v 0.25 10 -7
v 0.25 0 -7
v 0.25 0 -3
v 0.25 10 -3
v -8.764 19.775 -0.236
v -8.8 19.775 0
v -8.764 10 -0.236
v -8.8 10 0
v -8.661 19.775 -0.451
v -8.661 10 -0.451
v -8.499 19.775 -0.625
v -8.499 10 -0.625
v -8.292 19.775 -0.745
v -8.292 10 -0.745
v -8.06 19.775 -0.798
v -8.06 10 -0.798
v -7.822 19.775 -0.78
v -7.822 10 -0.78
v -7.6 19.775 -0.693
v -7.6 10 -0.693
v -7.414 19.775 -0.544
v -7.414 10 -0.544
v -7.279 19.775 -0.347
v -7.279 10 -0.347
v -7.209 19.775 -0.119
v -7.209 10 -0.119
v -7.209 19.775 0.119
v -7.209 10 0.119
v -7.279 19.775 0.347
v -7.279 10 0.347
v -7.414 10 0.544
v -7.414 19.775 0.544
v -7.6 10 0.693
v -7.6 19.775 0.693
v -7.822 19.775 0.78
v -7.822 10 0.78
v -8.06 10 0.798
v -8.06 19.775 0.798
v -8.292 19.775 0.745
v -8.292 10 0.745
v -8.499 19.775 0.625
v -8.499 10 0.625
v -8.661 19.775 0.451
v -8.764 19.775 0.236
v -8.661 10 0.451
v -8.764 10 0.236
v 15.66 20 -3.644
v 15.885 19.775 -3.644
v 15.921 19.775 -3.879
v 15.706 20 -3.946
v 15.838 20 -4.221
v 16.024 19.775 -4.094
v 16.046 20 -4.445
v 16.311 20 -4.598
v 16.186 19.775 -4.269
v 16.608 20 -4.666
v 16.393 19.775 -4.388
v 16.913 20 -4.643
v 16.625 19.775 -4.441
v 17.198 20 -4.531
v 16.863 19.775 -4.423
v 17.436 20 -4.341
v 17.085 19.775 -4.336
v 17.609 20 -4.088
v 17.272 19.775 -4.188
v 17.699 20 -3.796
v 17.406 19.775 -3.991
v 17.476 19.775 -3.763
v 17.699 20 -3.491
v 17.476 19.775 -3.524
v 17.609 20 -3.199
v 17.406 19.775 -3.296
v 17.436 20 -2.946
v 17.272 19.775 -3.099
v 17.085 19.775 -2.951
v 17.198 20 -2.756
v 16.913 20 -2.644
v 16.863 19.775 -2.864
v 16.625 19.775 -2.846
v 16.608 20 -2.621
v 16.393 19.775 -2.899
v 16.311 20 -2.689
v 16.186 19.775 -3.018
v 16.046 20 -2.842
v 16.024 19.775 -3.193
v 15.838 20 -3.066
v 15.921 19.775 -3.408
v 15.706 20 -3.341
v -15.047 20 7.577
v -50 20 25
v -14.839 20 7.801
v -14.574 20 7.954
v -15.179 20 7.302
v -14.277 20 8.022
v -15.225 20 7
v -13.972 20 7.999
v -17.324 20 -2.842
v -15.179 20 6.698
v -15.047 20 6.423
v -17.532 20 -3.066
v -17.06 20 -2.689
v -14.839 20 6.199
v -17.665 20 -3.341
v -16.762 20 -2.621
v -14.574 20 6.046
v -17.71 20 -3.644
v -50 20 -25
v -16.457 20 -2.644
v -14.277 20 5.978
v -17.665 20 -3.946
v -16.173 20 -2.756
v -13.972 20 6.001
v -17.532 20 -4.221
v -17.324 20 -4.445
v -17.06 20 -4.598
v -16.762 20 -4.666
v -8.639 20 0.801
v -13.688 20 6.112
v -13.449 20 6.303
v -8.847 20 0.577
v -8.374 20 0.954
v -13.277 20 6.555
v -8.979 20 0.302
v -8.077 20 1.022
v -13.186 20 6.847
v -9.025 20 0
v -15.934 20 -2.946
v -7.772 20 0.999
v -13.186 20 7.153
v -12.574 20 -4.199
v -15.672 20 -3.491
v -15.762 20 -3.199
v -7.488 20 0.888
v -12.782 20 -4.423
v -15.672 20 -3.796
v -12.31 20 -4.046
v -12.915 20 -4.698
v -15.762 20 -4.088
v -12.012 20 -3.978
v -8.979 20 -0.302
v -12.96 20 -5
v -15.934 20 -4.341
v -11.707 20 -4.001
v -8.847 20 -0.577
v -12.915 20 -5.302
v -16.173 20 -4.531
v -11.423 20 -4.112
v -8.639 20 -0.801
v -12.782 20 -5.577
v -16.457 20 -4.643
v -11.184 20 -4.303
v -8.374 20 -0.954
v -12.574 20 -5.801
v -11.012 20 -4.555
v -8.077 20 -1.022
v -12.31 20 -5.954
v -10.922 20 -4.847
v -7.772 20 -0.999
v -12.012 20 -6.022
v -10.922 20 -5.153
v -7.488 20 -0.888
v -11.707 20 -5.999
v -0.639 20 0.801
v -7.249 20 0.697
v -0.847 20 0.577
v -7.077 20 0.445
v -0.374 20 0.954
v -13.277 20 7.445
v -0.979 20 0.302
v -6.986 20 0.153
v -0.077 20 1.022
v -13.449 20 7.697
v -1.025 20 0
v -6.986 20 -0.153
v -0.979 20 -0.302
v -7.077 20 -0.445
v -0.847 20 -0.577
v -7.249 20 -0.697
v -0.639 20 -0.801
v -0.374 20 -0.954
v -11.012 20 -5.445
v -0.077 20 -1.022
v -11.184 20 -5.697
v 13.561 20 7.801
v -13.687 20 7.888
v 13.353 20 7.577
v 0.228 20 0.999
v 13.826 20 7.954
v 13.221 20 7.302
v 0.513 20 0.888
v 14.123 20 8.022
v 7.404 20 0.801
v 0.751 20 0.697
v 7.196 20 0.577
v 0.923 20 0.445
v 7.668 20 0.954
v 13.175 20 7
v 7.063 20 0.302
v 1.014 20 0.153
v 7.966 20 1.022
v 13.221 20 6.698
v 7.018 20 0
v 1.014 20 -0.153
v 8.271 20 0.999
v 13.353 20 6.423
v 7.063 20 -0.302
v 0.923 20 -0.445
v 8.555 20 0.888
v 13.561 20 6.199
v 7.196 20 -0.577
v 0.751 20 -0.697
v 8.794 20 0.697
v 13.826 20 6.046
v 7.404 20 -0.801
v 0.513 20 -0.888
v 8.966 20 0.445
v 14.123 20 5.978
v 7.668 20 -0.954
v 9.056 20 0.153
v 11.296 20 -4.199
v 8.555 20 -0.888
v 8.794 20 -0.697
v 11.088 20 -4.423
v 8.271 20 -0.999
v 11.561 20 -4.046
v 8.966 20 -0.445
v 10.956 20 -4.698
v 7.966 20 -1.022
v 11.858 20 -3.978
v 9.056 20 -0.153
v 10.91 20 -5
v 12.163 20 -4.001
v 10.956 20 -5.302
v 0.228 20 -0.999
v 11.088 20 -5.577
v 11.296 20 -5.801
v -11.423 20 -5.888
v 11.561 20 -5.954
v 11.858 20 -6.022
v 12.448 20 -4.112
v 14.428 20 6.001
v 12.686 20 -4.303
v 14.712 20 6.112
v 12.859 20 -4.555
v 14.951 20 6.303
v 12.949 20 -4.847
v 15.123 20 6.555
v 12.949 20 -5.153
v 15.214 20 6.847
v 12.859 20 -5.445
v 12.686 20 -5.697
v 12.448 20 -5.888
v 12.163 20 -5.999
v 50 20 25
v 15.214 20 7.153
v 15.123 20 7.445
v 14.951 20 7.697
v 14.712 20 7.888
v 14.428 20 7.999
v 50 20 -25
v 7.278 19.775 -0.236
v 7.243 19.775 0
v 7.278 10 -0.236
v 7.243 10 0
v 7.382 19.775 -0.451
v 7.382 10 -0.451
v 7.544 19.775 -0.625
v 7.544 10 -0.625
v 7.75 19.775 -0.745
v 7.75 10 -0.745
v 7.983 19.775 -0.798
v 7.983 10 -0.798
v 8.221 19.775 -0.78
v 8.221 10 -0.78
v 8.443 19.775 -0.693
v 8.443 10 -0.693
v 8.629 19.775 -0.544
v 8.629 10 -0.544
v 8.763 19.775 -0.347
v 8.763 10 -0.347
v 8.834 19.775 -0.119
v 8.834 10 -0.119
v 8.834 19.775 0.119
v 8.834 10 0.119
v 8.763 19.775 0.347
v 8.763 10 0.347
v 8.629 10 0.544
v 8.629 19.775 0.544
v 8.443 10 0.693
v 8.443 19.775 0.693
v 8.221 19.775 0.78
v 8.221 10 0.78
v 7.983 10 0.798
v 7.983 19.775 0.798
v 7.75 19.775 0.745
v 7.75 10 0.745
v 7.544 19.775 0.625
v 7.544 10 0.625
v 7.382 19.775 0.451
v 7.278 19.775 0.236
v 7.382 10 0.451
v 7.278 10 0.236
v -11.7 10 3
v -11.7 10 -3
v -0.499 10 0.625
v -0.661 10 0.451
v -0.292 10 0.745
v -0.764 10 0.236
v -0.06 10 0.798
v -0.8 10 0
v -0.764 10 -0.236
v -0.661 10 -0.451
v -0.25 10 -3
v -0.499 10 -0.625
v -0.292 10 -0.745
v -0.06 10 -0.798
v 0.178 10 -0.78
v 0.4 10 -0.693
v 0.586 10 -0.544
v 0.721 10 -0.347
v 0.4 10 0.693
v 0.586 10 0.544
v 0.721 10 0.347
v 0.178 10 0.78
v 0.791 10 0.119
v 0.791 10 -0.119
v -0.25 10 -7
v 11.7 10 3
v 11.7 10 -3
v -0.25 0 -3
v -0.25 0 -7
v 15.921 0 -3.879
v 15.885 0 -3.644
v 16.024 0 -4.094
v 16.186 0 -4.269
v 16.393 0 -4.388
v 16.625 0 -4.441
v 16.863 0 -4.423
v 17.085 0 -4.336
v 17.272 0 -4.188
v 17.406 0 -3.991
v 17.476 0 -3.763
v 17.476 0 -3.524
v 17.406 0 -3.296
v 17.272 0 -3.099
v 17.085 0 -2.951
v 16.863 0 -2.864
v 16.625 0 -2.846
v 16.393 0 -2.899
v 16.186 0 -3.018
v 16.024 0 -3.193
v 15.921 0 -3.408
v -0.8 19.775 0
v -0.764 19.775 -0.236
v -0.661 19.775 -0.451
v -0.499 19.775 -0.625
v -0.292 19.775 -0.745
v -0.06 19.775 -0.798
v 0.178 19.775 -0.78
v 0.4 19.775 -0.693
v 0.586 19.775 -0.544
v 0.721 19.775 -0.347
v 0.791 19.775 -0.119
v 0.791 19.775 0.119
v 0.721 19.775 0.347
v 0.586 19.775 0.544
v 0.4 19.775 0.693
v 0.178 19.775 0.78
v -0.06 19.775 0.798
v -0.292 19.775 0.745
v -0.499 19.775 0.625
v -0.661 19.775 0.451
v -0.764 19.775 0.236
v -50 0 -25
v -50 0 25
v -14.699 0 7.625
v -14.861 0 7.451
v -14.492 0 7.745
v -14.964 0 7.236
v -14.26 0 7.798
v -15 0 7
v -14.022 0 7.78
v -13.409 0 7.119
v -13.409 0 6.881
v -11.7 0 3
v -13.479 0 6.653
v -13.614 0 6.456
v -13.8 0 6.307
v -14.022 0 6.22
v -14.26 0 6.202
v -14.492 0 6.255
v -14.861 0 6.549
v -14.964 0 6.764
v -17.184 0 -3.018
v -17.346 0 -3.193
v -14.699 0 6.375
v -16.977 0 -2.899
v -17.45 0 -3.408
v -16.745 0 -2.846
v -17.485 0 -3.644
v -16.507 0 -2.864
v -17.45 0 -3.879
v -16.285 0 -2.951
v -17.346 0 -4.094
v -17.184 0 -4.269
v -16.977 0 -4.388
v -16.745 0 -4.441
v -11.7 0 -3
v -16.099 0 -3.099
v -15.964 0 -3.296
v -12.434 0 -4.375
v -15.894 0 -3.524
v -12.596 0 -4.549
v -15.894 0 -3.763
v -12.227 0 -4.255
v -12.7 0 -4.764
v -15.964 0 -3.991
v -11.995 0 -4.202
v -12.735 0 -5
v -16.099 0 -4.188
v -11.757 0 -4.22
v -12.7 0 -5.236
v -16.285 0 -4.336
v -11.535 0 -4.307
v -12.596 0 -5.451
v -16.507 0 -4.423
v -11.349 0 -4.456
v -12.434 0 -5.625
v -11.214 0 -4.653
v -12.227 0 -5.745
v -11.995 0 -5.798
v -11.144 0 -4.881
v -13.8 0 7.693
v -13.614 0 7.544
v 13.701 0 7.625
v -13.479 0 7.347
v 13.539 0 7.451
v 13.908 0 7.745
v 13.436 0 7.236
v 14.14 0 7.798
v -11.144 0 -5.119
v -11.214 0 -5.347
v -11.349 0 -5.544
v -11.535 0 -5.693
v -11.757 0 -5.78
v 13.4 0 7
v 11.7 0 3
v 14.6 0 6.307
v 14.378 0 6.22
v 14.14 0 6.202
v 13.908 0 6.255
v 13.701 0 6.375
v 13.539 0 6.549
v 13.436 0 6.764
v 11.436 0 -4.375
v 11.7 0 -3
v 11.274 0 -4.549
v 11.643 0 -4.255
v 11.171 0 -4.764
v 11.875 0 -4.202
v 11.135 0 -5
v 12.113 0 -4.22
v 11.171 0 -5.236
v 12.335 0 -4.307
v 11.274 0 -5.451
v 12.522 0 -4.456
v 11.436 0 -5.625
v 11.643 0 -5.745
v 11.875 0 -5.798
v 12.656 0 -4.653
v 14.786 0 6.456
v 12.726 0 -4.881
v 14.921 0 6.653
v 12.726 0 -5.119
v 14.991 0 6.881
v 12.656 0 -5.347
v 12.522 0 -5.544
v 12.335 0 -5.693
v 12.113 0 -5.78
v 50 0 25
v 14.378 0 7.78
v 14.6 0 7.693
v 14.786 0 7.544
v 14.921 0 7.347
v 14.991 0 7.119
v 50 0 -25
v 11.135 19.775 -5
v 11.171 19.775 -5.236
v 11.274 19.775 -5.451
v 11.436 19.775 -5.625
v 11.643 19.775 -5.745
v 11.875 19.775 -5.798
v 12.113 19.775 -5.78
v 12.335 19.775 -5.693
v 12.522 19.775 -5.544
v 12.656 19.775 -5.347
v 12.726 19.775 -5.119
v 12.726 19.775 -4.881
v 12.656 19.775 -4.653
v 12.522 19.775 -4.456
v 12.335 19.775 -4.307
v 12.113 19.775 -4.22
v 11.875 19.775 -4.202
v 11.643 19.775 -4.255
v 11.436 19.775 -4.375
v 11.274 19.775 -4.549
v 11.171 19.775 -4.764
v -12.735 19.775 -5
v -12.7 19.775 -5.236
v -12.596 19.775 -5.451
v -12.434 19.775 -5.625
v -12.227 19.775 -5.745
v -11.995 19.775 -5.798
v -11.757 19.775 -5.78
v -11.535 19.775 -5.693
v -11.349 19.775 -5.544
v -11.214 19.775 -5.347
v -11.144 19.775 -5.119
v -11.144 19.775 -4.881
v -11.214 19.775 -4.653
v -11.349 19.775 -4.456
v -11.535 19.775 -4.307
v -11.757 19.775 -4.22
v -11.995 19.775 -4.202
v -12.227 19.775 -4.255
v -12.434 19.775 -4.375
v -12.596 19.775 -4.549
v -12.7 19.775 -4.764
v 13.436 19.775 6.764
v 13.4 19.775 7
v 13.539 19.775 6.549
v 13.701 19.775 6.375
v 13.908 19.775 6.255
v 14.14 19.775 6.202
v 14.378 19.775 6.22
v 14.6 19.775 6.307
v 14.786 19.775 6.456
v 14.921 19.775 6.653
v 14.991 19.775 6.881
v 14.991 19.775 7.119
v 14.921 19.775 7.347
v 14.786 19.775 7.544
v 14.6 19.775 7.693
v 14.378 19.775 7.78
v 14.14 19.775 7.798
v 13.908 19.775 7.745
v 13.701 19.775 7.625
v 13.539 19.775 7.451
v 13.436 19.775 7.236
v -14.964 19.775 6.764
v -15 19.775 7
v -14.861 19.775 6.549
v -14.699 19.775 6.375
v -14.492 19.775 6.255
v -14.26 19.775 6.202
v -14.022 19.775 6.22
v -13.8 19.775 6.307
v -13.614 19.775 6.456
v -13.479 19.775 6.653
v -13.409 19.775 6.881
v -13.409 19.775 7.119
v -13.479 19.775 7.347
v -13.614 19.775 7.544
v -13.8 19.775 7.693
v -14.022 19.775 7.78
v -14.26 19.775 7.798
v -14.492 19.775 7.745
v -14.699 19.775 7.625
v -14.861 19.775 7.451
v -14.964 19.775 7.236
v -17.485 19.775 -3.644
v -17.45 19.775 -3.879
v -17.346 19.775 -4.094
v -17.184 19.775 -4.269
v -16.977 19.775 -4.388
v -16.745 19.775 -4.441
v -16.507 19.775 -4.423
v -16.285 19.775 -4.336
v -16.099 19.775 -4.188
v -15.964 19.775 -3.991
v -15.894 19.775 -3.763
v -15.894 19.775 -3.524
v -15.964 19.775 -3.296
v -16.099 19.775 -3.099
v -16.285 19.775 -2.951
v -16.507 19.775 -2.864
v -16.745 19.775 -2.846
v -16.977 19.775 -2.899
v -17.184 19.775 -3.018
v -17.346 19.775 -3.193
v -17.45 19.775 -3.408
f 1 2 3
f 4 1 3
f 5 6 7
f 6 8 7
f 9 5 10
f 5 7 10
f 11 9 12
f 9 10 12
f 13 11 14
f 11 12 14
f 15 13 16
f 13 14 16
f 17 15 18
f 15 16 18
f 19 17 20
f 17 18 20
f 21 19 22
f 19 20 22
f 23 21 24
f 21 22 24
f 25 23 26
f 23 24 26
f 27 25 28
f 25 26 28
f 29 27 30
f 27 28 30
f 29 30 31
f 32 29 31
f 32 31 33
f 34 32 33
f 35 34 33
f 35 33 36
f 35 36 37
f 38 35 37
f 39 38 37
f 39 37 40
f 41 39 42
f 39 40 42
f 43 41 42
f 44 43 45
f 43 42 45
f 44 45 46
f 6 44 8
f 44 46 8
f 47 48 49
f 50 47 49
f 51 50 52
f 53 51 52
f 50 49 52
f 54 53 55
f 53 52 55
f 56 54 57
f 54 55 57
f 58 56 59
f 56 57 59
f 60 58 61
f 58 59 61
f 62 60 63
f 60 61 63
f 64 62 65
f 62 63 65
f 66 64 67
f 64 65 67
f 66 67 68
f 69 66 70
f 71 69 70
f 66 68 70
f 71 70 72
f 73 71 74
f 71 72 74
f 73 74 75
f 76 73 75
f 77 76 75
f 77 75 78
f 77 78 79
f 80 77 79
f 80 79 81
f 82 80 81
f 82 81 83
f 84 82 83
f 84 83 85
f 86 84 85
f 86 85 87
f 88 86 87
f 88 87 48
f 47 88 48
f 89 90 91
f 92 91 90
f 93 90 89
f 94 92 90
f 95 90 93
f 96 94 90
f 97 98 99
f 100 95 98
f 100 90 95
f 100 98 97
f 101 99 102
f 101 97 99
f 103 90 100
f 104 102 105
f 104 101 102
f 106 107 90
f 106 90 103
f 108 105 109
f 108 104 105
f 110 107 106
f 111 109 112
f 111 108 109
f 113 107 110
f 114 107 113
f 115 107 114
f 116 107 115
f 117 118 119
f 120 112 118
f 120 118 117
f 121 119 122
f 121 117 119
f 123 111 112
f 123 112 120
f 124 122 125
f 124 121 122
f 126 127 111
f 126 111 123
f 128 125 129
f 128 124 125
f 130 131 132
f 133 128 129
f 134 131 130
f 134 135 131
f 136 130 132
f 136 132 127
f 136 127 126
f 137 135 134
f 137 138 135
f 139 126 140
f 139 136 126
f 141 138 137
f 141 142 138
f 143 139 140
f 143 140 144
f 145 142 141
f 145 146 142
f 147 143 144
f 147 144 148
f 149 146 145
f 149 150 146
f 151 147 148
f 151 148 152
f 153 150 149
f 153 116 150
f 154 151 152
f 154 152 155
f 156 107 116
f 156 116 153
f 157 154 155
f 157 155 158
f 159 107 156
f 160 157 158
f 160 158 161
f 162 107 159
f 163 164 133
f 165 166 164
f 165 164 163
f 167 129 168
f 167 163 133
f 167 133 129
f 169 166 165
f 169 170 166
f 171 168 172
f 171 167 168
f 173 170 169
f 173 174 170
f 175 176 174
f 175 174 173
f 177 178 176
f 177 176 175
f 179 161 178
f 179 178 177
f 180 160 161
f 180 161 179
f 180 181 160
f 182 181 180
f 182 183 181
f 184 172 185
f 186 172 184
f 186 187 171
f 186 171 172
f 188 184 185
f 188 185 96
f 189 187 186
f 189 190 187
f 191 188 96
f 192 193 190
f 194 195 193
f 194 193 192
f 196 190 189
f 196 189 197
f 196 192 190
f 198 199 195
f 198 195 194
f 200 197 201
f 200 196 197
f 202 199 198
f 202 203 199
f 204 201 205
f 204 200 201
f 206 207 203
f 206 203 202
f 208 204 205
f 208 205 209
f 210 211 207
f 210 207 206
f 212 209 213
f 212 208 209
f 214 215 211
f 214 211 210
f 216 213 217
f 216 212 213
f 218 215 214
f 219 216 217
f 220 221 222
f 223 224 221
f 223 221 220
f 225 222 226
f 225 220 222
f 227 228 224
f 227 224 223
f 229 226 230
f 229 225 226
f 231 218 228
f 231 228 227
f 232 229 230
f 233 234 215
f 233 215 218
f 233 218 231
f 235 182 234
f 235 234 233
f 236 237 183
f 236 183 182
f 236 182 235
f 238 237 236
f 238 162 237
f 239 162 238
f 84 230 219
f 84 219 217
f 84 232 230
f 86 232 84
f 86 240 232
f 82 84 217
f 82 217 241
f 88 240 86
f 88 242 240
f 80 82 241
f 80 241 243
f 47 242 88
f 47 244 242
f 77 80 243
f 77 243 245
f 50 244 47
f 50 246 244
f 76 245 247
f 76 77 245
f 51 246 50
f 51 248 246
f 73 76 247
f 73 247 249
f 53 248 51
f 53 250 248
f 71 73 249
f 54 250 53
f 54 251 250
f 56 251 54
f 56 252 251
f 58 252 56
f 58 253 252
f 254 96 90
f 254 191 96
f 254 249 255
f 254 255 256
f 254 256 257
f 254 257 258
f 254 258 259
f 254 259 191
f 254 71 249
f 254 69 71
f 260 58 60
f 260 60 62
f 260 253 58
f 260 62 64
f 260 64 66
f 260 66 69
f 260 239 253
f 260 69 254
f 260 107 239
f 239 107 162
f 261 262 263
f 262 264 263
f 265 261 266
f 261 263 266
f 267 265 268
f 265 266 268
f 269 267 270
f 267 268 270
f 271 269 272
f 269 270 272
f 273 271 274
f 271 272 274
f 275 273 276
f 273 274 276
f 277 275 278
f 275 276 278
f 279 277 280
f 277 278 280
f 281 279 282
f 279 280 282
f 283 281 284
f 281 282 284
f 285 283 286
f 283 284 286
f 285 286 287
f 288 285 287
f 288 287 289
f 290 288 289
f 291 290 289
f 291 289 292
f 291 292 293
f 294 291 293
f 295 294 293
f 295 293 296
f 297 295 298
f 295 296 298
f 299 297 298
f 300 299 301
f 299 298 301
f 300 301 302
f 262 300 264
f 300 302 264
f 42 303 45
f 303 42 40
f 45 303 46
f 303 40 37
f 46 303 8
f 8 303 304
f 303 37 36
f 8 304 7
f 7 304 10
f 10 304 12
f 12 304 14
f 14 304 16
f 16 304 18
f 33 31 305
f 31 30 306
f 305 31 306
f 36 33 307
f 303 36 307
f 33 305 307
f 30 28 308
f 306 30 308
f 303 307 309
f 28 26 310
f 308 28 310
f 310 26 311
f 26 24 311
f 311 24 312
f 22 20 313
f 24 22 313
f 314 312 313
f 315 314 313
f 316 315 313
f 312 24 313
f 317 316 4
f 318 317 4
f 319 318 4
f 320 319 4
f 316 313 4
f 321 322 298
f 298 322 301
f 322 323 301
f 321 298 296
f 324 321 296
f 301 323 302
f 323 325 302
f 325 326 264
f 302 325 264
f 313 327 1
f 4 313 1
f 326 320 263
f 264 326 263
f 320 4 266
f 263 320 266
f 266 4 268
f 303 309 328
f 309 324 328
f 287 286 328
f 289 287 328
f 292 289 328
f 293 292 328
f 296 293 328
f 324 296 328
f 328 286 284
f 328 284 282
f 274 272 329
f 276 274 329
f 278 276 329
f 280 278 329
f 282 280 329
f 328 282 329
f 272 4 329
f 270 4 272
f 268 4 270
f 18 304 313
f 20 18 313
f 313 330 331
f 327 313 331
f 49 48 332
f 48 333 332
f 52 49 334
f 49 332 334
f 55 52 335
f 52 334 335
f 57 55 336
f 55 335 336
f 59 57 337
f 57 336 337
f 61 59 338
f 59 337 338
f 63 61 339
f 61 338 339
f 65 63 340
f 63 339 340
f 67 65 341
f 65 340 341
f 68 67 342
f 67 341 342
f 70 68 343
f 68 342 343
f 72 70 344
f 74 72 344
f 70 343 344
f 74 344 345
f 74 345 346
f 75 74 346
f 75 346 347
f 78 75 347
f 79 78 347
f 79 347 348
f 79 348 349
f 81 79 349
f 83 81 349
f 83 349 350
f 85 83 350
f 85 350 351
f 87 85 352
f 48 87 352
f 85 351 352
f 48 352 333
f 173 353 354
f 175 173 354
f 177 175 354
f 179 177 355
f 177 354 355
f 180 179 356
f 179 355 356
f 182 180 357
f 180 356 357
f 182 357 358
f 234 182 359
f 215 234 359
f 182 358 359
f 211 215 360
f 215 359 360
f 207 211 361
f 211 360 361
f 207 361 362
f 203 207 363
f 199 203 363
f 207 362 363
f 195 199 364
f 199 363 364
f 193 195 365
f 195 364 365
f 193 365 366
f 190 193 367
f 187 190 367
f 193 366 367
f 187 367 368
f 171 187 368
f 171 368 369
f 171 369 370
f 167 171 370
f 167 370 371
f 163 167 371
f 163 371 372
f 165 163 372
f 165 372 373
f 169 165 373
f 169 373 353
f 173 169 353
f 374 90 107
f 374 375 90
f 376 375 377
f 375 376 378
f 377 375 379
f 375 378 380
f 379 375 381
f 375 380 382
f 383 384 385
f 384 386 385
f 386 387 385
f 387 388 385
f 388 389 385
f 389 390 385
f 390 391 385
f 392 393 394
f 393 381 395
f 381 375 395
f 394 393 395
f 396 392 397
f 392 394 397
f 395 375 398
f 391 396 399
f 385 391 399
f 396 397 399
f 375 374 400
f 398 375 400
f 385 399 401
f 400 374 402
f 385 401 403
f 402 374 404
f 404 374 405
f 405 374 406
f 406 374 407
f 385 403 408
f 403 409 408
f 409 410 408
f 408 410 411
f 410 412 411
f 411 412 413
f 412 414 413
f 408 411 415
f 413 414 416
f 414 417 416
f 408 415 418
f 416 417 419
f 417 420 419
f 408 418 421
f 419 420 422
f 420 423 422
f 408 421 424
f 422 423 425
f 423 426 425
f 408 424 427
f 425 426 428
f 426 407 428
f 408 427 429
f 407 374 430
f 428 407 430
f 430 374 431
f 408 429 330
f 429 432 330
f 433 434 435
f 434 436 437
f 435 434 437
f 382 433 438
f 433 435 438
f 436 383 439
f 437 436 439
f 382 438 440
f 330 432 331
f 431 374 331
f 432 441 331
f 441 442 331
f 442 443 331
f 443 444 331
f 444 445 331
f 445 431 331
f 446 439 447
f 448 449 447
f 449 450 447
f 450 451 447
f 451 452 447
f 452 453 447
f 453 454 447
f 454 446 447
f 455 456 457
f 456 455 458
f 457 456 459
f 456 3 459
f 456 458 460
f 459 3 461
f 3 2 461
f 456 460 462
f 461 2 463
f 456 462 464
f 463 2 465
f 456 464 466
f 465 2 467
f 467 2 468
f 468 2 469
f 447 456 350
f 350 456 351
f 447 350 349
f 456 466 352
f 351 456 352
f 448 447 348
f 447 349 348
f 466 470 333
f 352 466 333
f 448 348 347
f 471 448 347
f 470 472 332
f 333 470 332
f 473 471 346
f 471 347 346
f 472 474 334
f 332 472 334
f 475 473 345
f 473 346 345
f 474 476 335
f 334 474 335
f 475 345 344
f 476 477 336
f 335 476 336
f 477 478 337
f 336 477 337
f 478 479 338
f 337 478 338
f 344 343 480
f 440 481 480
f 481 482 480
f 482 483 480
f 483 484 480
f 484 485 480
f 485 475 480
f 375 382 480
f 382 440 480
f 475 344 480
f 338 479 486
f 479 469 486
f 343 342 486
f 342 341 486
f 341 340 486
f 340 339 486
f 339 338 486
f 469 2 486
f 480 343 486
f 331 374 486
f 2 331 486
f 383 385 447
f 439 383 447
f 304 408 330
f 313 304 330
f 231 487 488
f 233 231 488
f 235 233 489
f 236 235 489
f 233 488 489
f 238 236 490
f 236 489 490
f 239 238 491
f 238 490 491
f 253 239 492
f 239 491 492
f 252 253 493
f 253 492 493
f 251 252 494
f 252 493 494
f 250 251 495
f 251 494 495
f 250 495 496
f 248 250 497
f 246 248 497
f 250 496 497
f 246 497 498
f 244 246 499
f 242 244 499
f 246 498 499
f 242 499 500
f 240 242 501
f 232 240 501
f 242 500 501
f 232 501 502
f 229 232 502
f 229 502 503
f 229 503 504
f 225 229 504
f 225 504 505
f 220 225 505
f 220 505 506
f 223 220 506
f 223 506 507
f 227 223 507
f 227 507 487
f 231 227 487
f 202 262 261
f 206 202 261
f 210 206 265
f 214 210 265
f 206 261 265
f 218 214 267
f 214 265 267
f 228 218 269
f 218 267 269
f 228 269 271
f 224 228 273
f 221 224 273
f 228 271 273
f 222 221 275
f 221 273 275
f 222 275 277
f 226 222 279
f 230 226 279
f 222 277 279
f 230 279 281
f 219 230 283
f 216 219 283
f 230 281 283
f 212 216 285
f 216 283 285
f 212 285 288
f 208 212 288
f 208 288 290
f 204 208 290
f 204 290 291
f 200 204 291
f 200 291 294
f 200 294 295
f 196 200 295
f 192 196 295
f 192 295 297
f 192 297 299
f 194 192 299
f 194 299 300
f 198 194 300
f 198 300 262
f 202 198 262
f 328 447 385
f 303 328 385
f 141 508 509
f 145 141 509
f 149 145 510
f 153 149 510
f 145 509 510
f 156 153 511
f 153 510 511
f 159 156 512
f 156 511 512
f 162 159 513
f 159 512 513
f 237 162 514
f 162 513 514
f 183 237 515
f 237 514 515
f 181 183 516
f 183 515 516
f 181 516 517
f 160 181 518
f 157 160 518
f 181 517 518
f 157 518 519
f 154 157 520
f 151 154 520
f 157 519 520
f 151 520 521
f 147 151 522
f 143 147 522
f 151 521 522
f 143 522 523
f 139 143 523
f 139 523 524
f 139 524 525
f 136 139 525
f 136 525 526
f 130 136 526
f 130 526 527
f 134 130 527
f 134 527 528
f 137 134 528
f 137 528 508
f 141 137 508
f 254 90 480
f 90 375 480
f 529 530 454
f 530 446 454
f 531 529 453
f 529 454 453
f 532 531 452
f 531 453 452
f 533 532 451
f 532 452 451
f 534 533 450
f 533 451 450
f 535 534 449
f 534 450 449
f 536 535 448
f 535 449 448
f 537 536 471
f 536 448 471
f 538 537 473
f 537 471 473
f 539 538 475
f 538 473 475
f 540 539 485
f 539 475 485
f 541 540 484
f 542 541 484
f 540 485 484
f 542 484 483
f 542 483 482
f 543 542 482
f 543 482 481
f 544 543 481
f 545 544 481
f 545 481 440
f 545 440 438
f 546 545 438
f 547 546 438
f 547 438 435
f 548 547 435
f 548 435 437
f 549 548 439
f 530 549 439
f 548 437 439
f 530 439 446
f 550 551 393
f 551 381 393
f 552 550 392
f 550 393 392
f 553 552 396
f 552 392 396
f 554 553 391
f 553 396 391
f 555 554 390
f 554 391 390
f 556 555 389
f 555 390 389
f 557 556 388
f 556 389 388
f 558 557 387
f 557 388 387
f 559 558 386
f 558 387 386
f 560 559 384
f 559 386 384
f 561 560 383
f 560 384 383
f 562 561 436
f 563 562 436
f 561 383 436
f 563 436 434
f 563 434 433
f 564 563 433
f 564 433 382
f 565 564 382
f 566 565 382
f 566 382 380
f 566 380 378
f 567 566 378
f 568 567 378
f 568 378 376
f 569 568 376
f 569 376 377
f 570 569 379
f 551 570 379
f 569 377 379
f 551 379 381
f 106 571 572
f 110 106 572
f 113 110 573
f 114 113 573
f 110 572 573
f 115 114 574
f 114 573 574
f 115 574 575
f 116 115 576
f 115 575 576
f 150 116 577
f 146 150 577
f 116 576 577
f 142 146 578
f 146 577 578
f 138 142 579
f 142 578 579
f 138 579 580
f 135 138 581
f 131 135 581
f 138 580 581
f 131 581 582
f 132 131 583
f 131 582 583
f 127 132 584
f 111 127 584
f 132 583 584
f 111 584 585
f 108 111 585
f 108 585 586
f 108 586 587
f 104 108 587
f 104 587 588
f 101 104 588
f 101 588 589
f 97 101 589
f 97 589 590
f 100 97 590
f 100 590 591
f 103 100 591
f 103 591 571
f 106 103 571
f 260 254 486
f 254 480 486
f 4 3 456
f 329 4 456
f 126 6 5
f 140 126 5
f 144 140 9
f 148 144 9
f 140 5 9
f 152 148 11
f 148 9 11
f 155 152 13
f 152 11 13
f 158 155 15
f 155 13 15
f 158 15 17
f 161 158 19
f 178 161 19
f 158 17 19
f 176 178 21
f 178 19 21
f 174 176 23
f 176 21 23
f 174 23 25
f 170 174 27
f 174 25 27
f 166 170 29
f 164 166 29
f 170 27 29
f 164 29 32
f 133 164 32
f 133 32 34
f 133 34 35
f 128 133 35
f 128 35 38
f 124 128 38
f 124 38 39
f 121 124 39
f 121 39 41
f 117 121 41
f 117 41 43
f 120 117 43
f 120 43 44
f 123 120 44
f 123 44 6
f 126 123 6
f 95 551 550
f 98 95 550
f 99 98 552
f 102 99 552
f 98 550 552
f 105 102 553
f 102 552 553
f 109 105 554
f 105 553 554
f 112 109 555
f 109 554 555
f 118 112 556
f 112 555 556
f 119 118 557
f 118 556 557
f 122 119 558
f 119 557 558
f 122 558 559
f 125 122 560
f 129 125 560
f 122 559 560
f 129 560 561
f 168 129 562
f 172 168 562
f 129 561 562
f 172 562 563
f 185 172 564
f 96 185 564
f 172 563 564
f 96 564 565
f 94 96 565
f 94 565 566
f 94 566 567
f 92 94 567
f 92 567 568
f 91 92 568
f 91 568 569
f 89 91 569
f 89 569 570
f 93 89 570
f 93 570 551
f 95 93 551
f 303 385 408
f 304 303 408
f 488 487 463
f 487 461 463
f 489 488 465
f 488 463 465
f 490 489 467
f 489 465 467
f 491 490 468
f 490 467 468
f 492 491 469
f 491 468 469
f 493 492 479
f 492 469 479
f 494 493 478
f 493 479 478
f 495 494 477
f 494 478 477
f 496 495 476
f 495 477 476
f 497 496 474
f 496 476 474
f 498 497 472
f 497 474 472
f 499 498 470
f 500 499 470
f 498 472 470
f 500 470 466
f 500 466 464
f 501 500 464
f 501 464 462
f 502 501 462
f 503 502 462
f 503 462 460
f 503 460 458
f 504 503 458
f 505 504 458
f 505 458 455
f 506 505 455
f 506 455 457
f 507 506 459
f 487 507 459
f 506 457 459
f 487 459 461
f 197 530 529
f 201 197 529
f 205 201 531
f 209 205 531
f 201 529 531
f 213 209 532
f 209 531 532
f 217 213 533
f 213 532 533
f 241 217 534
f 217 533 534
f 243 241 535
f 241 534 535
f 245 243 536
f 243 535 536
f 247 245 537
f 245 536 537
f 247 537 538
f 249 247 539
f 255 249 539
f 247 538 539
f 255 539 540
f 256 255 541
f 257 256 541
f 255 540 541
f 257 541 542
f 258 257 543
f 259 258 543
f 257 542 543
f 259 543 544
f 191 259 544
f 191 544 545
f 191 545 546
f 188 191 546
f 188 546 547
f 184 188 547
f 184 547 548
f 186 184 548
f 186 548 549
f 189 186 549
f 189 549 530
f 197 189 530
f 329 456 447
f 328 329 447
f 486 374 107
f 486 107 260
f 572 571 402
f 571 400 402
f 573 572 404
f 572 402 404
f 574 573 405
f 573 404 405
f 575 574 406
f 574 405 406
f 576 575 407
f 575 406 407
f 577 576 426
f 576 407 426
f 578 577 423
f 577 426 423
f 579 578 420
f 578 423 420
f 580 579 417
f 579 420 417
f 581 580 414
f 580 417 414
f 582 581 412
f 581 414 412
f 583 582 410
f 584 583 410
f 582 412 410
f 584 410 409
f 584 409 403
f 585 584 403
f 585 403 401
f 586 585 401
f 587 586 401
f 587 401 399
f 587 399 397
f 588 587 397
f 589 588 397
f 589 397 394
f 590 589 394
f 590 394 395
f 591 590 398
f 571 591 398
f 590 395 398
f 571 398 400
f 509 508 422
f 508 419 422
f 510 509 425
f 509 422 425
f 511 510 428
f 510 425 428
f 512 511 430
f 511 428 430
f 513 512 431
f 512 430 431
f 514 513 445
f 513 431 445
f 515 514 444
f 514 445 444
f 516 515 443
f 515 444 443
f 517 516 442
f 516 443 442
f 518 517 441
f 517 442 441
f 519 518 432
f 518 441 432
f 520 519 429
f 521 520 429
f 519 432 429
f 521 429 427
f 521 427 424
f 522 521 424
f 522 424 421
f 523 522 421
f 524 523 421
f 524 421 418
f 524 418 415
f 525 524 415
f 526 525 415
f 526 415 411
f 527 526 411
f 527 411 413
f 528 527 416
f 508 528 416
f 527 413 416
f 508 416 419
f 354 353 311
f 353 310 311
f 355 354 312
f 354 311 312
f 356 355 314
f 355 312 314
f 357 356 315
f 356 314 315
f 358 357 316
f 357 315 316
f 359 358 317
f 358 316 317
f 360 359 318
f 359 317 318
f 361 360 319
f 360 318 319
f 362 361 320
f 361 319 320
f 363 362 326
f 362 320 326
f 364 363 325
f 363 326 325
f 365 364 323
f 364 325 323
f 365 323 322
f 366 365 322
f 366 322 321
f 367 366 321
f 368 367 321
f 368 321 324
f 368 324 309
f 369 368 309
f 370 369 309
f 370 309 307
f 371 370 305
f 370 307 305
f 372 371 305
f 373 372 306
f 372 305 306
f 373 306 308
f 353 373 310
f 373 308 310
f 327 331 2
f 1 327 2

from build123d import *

# Parameters (mm, degrees)
SKETCH1_W                   = 100
SKETCH1_H                   = 50
SKETCH1_R                   = 0.5
BOSS_EXTRUDE6_DEPTH         = 10
SKETCH3_W                   = 100
SKETCH3_H                   = 50
BOSS_EXTRUDE7_DEPTH         = 10
M2_TAPPED_HOLE1_D           = 1.6
M2_TAPPED_HOLE1_DEPTH       = 20
M2_TAPPED_HOLE1_CSINK_D     = 2.05
M2_TAPPED_HOLE1_CSINK_ANGLE = 90
M2_TAPPED_HOLE1_TIP         = 0.480688495


with BuildPart() as part:
    # Sketch1 → Boss-Extrude6 (new body)
    with BuildSketch(Plane(origin=(0, 0, 0), x_dir=(1, 0, 0), z_dir=(0, 1, 0))):
        Rectangle(SKETCH1_W, SKETCH1_H)
        with Locations((-14.2, -7)):
            Circle(SKETCH1_R, mode=Mode.SUBTRACT)
        with Locations((14.2, -7)):
            Circle(SKETCH1_R, mode=Mode.SUBTRACT)
        with Locations((-16.685084167, 3.643524774)):
            Circle(SKETCH1_R, mode=Mode.SUBTRACT)
        with Locations((16.685084167, 3.643524774)):
            Circle(SKETCH1_R, mode=Mode.SUBTRACT)
        with Locations((-11.935084167, 5)):
            Circle(SKETCH1_R, mode=Mode.SUBTRACT)
        with Locations((11.935084167, 5)):
            Circle(SKETCH1_R, mode=Mode.SUBTRACT)
        Polygon((-11.7, 3), (-0.25, 3), (-0.25, 7), (0.25, 7), (0.25, 3), (11.7, 3), (11.7, -3), (-11.7, -3), align=None, mode=Mode.SUBTRACT)
    extrude(amount=BOSS_EXTRUDE6_DEPTH)

    # Sketch3 → Boss-Extrude7 (add)
    with BuildSketch(Plane(origin=(0, 10, 0), x_dir=(1, 0, 0), z_dir=(0, 1, 0))):
        Rectangle(SKETCH3_W, SKETCH3_H)
    extrude(amount=BOSS_EXTRUDE7_DEPTH)

    # M2 Tapped Hole1
    with Locations(Plane(origin=(0, 20, 0), x_dir=(1, 0, 0), z_dir=(0, 1, 0))):
        with Locations((-16.685084167, 3.643524774), (-11.935084167, 5), (11.935084167, 5), (16.685084167, 3.643524774), (14.2, -7), (-14.2, -7), (-8, 0), (8.042631754, 0), (0, 0)):
            CounterSinkHole(M2_TAPPED_HOLE1_D / 2, M2_TAPPED_HOLE1_CSINK_D / 2, depth=M2_TAPPED_HOLE1_DEPTH, counter_sink_angle=M2_TAPPED_HOLE1_CSINK_ANGLE)
            with Locations((0, 0, -(M2_TAPPED_HOLE1_DEPTH + M2_TAPPED_HOLE1_TIP / 2))):  # 118° drill point
                Cone(0, M2_TAPPED_HOLE1_D / 2, M2_TAPPED_HOLE1_TIP, mode=Mode.SUBTRACT)


solid = part.part
